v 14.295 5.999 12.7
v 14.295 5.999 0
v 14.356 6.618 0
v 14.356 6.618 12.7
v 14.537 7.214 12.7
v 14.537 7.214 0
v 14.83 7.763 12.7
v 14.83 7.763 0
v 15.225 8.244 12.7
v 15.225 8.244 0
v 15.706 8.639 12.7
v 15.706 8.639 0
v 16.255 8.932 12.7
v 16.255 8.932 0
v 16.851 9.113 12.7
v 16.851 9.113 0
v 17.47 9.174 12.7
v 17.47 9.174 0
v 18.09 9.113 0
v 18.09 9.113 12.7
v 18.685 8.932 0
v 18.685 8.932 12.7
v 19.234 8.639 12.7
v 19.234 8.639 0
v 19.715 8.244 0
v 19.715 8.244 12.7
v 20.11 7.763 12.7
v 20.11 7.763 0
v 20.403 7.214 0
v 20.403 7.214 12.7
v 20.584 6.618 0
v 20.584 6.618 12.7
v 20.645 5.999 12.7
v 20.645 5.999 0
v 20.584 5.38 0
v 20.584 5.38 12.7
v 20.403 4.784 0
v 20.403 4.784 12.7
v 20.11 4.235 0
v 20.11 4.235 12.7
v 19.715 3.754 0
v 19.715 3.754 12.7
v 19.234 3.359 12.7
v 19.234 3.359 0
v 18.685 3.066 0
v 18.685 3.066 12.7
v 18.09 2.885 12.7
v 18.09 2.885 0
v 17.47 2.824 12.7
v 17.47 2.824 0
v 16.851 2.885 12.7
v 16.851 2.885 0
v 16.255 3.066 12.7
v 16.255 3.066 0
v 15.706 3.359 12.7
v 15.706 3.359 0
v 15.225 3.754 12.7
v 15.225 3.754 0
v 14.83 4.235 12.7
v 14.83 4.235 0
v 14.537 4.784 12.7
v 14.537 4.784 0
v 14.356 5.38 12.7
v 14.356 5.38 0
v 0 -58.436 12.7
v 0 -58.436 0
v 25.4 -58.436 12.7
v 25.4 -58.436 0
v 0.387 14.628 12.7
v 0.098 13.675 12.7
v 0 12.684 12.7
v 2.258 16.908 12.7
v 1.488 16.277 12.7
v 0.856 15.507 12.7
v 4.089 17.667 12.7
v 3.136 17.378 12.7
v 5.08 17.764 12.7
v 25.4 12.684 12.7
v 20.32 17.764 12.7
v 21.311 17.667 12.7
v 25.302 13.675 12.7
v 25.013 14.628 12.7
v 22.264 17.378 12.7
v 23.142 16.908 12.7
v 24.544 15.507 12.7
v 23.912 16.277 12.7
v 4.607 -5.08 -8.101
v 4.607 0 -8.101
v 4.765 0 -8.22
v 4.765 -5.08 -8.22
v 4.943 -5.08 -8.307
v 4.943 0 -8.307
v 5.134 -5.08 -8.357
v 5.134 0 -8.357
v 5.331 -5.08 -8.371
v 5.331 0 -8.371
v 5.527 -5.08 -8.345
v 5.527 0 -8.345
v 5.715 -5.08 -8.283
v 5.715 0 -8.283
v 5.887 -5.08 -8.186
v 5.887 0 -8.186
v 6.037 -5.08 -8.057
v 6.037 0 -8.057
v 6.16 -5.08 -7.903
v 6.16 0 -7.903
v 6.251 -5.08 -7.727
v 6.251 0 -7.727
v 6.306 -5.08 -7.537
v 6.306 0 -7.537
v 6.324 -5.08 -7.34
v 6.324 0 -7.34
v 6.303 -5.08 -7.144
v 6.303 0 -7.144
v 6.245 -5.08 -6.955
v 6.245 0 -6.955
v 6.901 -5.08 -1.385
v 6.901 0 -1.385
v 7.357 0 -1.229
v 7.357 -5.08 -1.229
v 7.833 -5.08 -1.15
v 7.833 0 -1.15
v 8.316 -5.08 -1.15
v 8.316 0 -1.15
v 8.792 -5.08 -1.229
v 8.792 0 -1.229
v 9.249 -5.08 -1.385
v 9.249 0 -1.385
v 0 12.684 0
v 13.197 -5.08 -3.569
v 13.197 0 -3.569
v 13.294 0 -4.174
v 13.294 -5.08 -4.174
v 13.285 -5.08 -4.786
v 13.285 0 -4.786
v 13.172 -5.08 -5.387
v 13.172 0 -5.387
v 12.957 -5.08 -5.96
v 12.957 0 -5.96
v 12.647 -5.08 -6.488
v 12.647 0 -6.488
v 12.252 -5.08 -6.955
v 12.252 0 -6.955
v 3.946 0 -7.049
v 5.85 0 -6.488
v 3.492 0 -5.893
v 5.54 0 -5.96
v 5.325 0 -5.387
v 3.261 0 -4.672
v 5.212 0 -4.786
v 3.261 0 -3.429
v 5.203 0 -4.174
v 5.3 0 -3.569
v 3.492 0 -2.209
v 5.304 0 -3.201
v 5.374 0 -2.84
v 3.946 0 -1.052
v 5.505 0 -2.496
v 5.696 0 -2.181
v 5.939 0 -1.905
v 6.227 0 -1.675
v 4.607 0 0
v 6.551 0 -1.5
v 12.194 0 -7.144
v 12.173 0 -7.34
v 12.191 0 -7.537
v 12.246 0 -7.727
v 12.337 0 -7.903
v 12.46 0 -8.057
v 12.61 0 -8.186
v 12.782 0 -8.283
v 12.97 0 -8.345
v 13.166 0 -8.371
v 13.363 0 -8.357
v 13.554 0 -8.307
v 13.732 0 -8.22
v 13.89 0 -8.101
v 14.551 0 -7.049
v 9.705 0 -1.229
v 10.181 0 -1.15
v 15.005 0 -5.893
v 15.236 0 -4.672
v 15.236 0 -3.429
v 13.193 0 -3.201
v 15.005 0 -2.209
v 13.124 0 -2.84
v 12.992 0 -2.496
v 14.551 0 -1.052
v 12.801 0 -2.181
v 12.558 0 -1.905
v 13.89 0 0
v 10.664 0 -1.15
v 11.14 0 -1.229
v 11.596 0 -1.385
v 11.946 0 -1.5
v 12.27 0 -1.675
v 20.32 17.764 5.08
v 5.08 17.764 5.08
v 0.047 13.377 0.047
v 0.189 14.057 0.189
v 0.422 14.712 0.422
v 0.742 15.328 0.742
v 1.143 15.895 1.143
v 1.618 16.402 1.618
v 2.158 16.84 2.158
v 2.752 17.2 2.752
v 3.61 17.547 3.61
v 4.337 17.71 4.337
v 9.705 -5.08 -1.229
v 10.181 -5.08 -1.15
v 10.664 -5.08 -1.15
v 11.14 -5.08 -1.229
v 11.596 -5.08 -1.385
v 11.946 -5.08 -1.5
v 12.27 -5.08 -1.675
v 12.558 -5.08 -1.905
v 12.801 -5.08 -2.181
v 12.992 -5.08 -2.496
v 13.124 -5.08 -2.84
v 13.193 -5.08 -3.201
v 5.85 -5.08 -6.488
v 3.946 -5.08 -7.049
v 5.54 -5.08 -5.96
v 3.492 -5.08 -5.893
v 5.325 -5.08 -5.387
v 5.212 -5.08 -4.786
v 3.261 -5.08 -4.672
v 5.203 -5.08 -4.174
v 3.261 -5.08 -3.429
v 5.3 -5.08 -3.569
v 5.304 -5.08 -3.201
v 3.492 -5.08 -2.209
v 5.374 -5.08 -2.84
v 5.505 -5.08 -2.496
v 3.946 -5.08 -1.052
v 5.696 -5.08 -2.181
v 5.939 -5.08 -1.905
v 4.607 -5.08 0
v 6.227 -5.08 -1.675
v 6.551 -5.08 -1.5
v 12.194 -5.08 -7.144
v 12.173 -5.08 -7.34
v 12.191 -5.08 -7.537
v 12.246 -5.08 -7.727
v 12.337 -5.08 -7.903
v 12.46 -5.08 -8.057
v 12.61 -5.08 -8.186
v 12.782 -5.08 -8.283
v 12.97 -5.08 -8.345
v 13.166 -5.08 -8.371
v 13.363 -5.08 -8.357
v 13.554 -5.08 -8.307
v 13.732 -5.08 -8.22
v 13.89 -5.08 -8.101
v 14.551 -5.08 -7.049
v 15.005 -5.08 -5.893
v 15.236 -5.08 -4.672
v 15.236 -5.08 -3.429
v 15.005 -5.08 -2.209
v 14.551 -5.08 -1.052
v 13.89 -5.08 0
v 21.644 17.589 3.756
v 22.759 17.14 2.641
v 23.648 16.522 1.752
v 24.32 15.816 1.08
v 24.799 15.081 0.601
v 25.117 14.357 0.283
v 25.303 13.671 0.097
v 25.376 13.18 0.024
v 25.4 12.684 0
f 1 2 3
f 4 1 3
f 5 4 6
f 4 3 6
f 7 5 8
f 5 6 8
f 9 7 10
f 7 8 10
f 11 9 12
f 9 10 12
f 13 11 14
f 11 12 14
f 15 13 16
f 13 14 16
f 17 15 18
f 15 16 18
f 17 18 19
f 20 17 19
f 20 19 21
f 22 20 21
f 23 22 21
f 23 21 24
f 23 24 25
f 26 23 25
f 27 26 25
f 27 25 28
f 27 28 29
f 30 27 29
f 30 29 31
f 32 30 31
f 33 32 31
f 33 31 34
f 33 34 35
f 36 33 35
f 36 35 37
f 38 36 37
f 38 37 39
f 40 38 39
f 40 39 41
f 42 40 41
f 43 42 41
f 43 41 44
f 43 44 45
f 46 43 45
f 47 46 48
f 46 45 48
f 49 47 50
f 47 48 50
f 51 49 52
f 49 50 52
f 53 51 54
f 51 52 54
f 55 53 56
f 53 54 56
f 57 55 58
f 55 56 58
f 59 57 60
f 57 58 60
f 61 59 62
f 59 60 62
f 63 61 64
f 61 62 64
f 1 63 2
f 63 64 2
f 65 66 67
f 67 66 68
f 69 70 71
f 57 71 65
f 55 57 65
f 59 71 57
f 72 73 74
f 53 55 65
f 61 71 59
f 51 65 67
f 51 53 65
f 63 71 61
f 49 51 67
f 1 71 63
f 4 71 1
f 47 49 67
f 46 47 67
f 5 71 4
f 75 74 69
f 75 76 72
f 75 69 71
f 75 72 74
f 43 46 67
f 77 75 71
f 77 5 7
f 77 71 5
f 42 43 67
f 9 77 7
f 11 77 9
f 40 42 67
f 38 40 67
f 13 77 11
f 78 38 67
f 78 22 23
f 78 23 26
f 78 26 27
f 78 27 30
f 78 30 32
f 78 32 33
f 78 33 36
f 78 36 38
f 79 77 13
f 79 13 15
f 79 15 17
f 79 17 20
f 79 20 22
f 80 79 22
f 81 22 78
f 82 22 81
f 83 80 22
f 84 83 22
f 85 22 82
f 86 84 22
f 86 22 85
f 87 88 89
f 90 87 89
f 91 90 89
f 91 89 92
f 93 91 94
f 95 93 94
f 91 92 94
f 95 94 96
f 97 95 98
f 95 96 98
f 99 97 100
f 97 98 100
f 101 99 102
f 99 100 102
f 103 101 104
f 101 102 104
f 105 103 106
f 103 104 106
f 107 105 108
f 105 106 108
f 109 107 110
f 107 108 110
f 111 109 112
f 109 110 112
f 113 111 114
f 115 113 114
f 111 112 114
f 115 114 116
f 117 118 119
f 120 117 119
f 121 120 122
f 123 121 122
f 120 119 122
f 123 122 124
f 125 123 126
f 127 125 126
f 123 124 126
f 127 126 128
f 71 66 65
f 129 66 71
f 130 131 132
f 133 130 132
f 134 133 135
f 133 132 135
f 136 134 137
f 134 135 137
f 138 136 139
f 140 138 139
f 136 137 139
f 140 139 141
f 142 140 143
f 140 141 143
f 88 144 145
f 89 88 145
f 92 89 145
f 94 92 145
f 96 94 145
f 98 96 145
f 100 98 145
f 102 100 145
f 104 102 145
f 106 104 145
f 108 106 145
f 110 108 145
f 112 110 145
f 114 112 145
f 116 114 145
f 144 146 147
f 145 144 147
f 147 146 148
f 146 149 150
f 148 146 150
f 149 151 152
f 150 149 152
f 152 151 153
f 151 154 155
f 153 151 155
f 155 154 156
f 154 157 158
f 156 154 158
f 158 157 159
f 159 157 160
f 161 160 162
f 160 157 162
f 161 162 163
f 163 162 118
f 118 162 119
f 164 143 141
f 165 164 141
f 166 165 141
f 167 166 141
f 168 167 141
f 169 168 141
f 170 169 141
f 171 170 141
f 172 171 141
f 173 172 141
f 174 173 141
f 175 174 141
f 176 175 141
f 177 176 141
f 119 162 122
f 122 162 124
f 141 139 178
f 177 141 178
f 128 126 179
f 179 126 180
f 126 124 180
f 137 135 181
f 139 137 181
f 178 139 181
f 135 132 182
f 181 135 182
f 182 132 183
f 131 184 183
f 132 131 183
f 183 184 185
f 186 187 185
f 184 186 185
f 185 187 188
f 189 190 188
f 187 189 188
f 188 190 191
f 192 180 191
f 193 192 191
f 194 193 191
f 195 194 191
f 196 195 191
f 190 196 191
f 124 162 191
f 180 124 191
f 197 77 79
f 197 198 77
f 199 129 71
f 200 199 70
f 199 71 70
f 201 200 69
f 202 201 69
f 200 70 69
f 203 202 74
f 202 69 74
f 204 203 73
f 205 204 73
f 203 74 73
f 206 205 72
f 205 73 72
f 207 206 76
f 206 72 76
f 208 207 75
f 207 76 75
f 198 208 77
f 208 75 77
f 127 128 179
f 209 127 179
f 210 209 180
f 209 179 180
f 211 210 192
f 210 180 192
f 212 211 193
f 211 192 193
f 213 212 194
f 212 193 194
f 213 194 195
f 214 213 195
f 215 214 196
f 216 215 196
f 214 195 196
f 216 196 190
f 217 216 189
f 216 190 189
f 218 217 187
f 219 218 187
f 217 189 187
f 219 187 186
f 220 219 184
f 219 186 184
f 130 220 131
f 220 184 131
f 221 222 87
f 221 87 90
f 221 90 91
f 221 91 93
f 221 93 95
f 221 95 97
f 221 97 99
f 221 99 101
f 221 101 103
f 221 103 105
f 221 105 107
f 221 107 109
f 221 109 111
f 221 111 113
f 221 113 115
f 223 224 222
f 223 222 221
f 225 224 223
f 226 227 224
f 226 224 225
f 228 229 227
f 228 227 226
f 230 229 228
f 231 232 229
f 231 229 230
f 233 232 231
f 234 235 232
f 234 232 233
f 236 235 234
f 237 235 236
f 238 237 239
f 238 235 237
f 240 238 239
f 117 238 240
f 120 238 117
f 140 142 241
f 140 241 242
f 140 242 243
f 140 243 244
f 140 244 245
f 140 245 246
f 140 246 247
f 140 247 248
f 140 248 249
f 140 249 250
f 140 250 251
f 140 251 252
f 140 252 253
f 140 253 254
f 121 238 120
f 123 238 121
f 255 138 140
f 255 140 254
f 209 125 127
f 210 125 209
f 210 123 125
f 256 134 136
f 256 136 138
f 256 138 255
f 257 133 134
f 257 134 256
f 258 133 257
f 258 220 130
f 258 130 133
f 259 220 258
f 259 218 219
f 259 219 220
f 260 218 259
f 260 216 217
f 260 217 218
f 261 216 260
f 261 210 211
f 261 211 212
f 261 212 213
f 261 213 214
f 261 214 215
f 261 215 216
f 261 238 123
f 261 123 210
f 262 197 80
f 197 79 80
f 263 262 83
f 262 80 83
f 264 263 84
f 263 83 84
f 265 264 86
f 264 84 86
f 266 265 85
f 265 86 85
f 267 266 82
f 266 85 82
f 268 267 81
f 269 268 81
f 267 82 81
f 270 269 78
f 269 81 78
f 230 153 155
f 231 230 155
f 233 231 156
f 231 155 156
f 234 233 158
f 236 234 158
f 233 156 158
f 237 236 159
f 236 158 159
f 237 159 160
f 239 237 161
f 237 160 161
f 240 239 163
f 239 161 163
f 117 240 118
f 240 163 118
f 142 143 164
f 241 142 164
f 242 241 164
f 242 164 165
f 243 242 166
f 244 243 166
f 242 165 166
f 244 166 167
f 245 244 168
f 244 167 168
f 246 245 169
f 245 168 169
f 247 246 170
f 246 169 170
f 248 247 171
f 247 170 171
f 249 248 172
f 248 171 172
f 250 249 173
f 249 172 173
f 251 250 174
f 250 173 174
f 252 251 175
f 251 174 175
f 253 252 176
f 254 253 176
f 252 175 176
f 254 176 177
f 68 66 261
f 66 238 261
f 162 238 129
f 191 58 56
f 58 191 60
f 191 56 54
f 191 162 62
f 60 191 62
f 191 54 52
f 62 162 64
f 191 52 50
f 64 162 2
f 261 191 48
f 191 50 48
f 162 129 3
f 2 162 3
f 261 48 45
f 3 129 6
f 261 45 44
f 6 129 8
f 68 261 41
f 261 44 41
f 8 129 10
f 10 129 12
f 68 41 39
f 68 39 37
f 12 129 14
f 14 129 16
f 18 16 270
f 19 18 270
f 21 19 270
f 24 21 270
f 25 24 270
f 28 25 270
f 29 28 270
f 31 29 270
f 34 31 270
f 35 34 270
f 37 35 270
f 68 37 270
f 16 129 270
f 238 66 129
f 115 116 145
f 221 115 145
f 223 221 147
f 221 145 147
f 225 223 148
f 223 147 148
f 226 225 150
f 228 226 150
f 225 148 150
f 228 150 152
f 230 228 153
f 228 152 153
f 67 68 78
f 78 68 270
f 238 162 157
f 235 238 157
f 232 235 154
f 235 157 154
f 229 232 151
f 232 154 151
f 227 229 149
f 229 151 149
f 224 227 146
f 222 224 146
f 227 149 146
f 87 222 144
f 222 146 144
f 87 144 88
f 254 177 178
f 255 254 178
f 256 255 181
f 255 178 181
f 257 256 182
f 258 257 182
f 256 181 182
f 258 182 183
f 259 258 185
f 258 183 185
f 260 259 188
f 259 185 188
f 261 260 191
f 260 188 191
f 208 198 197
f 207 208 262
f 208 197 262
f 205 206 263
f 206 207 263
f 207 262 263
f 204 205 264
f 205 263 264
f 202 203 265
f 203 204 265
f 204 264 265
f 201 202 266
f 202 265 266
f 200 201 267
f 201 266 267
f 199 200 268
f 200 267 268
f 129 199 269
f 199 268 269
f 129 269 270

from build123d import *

# Parameters (mm, degrees)
F0_W     = 25.4
F0_H     = 76.2
F1_DEPTH = 12.7
F3_D     = 6.35
F5_DEPTH = 5.08
F6_R     = 5.08


with BuildPart() as f1:
    # F0 (on Top) → F1 (new body)
    with BuildSketch(Plane.XY):
        with Locations((12.7, -20.335565)):
            Rectangle(F0_W, F0_H)
    extrude(amount=F1_DEPTH)

    # F3 (through all)
    with Locations(Plane.XY.offset(12.7)):
        with Locations((17.470095, 5.998946)):
            Hole(F3_D / 2)

    # F4 (on Front) → F5 (join)
    with BuildSketch(Plane.XZ):
        with BuildLine():
            Line((13.889657, 0), (9.24853, 0))
            Line((9.24853, 0), (4.607402, 0))
            ThreePointArc((4.607402, 0), (3.231891, -4.050694), (4.607402, -8.101388))
            ThreePointArc((4.607402, -8.101388), (5.886924, -8.185929), (6.245447, -6.954757))
            ThreePointArc((6.245447, -6.954757), (5.325208, -5.387091), (5.299789, -3.569464))
            ThreePointArc((5.299789, -3.569464), (5.695978, -2.181126), (6.900665, -1.385403))
            ThreePointArc((6.900665, -1.385403), (8.074597, -1.140454), (9.24853, -1.385403))
            ThreePointArc((9.24853, -1.385403), (10.422462, -1.140454), (11.596394, -1.385403))
            ThreePointArc((11.596394, -1.385403), (12.801081, -2.181126), (13.19727, -3.569464))
            ThreePointArc((13.19727, -3.569464), (13.171851, -5.387091), (12.251612, -6.954757))
            ThreePointArc((12.251612, -6.954757), (12.610135, -8.185929), (13.889657, -8.101388))
            ThreePointArc((13.889657, -8.101388), (15.265168, -4.050694), (13.889657, 0))
        make_face()
    extrude(amount=F5_DEPTH)

    # F6
    f6_edges = [f1.edges().sort_by_distance(p)[0] for p in [
        (0, 17.764435, 6.35),
        (25.4, 17.764435, 6.35),
        (12.7, 17.764435, 0),
    ]]
    fillet(f6_edges, radius=F6_R)


solid = f1.part
